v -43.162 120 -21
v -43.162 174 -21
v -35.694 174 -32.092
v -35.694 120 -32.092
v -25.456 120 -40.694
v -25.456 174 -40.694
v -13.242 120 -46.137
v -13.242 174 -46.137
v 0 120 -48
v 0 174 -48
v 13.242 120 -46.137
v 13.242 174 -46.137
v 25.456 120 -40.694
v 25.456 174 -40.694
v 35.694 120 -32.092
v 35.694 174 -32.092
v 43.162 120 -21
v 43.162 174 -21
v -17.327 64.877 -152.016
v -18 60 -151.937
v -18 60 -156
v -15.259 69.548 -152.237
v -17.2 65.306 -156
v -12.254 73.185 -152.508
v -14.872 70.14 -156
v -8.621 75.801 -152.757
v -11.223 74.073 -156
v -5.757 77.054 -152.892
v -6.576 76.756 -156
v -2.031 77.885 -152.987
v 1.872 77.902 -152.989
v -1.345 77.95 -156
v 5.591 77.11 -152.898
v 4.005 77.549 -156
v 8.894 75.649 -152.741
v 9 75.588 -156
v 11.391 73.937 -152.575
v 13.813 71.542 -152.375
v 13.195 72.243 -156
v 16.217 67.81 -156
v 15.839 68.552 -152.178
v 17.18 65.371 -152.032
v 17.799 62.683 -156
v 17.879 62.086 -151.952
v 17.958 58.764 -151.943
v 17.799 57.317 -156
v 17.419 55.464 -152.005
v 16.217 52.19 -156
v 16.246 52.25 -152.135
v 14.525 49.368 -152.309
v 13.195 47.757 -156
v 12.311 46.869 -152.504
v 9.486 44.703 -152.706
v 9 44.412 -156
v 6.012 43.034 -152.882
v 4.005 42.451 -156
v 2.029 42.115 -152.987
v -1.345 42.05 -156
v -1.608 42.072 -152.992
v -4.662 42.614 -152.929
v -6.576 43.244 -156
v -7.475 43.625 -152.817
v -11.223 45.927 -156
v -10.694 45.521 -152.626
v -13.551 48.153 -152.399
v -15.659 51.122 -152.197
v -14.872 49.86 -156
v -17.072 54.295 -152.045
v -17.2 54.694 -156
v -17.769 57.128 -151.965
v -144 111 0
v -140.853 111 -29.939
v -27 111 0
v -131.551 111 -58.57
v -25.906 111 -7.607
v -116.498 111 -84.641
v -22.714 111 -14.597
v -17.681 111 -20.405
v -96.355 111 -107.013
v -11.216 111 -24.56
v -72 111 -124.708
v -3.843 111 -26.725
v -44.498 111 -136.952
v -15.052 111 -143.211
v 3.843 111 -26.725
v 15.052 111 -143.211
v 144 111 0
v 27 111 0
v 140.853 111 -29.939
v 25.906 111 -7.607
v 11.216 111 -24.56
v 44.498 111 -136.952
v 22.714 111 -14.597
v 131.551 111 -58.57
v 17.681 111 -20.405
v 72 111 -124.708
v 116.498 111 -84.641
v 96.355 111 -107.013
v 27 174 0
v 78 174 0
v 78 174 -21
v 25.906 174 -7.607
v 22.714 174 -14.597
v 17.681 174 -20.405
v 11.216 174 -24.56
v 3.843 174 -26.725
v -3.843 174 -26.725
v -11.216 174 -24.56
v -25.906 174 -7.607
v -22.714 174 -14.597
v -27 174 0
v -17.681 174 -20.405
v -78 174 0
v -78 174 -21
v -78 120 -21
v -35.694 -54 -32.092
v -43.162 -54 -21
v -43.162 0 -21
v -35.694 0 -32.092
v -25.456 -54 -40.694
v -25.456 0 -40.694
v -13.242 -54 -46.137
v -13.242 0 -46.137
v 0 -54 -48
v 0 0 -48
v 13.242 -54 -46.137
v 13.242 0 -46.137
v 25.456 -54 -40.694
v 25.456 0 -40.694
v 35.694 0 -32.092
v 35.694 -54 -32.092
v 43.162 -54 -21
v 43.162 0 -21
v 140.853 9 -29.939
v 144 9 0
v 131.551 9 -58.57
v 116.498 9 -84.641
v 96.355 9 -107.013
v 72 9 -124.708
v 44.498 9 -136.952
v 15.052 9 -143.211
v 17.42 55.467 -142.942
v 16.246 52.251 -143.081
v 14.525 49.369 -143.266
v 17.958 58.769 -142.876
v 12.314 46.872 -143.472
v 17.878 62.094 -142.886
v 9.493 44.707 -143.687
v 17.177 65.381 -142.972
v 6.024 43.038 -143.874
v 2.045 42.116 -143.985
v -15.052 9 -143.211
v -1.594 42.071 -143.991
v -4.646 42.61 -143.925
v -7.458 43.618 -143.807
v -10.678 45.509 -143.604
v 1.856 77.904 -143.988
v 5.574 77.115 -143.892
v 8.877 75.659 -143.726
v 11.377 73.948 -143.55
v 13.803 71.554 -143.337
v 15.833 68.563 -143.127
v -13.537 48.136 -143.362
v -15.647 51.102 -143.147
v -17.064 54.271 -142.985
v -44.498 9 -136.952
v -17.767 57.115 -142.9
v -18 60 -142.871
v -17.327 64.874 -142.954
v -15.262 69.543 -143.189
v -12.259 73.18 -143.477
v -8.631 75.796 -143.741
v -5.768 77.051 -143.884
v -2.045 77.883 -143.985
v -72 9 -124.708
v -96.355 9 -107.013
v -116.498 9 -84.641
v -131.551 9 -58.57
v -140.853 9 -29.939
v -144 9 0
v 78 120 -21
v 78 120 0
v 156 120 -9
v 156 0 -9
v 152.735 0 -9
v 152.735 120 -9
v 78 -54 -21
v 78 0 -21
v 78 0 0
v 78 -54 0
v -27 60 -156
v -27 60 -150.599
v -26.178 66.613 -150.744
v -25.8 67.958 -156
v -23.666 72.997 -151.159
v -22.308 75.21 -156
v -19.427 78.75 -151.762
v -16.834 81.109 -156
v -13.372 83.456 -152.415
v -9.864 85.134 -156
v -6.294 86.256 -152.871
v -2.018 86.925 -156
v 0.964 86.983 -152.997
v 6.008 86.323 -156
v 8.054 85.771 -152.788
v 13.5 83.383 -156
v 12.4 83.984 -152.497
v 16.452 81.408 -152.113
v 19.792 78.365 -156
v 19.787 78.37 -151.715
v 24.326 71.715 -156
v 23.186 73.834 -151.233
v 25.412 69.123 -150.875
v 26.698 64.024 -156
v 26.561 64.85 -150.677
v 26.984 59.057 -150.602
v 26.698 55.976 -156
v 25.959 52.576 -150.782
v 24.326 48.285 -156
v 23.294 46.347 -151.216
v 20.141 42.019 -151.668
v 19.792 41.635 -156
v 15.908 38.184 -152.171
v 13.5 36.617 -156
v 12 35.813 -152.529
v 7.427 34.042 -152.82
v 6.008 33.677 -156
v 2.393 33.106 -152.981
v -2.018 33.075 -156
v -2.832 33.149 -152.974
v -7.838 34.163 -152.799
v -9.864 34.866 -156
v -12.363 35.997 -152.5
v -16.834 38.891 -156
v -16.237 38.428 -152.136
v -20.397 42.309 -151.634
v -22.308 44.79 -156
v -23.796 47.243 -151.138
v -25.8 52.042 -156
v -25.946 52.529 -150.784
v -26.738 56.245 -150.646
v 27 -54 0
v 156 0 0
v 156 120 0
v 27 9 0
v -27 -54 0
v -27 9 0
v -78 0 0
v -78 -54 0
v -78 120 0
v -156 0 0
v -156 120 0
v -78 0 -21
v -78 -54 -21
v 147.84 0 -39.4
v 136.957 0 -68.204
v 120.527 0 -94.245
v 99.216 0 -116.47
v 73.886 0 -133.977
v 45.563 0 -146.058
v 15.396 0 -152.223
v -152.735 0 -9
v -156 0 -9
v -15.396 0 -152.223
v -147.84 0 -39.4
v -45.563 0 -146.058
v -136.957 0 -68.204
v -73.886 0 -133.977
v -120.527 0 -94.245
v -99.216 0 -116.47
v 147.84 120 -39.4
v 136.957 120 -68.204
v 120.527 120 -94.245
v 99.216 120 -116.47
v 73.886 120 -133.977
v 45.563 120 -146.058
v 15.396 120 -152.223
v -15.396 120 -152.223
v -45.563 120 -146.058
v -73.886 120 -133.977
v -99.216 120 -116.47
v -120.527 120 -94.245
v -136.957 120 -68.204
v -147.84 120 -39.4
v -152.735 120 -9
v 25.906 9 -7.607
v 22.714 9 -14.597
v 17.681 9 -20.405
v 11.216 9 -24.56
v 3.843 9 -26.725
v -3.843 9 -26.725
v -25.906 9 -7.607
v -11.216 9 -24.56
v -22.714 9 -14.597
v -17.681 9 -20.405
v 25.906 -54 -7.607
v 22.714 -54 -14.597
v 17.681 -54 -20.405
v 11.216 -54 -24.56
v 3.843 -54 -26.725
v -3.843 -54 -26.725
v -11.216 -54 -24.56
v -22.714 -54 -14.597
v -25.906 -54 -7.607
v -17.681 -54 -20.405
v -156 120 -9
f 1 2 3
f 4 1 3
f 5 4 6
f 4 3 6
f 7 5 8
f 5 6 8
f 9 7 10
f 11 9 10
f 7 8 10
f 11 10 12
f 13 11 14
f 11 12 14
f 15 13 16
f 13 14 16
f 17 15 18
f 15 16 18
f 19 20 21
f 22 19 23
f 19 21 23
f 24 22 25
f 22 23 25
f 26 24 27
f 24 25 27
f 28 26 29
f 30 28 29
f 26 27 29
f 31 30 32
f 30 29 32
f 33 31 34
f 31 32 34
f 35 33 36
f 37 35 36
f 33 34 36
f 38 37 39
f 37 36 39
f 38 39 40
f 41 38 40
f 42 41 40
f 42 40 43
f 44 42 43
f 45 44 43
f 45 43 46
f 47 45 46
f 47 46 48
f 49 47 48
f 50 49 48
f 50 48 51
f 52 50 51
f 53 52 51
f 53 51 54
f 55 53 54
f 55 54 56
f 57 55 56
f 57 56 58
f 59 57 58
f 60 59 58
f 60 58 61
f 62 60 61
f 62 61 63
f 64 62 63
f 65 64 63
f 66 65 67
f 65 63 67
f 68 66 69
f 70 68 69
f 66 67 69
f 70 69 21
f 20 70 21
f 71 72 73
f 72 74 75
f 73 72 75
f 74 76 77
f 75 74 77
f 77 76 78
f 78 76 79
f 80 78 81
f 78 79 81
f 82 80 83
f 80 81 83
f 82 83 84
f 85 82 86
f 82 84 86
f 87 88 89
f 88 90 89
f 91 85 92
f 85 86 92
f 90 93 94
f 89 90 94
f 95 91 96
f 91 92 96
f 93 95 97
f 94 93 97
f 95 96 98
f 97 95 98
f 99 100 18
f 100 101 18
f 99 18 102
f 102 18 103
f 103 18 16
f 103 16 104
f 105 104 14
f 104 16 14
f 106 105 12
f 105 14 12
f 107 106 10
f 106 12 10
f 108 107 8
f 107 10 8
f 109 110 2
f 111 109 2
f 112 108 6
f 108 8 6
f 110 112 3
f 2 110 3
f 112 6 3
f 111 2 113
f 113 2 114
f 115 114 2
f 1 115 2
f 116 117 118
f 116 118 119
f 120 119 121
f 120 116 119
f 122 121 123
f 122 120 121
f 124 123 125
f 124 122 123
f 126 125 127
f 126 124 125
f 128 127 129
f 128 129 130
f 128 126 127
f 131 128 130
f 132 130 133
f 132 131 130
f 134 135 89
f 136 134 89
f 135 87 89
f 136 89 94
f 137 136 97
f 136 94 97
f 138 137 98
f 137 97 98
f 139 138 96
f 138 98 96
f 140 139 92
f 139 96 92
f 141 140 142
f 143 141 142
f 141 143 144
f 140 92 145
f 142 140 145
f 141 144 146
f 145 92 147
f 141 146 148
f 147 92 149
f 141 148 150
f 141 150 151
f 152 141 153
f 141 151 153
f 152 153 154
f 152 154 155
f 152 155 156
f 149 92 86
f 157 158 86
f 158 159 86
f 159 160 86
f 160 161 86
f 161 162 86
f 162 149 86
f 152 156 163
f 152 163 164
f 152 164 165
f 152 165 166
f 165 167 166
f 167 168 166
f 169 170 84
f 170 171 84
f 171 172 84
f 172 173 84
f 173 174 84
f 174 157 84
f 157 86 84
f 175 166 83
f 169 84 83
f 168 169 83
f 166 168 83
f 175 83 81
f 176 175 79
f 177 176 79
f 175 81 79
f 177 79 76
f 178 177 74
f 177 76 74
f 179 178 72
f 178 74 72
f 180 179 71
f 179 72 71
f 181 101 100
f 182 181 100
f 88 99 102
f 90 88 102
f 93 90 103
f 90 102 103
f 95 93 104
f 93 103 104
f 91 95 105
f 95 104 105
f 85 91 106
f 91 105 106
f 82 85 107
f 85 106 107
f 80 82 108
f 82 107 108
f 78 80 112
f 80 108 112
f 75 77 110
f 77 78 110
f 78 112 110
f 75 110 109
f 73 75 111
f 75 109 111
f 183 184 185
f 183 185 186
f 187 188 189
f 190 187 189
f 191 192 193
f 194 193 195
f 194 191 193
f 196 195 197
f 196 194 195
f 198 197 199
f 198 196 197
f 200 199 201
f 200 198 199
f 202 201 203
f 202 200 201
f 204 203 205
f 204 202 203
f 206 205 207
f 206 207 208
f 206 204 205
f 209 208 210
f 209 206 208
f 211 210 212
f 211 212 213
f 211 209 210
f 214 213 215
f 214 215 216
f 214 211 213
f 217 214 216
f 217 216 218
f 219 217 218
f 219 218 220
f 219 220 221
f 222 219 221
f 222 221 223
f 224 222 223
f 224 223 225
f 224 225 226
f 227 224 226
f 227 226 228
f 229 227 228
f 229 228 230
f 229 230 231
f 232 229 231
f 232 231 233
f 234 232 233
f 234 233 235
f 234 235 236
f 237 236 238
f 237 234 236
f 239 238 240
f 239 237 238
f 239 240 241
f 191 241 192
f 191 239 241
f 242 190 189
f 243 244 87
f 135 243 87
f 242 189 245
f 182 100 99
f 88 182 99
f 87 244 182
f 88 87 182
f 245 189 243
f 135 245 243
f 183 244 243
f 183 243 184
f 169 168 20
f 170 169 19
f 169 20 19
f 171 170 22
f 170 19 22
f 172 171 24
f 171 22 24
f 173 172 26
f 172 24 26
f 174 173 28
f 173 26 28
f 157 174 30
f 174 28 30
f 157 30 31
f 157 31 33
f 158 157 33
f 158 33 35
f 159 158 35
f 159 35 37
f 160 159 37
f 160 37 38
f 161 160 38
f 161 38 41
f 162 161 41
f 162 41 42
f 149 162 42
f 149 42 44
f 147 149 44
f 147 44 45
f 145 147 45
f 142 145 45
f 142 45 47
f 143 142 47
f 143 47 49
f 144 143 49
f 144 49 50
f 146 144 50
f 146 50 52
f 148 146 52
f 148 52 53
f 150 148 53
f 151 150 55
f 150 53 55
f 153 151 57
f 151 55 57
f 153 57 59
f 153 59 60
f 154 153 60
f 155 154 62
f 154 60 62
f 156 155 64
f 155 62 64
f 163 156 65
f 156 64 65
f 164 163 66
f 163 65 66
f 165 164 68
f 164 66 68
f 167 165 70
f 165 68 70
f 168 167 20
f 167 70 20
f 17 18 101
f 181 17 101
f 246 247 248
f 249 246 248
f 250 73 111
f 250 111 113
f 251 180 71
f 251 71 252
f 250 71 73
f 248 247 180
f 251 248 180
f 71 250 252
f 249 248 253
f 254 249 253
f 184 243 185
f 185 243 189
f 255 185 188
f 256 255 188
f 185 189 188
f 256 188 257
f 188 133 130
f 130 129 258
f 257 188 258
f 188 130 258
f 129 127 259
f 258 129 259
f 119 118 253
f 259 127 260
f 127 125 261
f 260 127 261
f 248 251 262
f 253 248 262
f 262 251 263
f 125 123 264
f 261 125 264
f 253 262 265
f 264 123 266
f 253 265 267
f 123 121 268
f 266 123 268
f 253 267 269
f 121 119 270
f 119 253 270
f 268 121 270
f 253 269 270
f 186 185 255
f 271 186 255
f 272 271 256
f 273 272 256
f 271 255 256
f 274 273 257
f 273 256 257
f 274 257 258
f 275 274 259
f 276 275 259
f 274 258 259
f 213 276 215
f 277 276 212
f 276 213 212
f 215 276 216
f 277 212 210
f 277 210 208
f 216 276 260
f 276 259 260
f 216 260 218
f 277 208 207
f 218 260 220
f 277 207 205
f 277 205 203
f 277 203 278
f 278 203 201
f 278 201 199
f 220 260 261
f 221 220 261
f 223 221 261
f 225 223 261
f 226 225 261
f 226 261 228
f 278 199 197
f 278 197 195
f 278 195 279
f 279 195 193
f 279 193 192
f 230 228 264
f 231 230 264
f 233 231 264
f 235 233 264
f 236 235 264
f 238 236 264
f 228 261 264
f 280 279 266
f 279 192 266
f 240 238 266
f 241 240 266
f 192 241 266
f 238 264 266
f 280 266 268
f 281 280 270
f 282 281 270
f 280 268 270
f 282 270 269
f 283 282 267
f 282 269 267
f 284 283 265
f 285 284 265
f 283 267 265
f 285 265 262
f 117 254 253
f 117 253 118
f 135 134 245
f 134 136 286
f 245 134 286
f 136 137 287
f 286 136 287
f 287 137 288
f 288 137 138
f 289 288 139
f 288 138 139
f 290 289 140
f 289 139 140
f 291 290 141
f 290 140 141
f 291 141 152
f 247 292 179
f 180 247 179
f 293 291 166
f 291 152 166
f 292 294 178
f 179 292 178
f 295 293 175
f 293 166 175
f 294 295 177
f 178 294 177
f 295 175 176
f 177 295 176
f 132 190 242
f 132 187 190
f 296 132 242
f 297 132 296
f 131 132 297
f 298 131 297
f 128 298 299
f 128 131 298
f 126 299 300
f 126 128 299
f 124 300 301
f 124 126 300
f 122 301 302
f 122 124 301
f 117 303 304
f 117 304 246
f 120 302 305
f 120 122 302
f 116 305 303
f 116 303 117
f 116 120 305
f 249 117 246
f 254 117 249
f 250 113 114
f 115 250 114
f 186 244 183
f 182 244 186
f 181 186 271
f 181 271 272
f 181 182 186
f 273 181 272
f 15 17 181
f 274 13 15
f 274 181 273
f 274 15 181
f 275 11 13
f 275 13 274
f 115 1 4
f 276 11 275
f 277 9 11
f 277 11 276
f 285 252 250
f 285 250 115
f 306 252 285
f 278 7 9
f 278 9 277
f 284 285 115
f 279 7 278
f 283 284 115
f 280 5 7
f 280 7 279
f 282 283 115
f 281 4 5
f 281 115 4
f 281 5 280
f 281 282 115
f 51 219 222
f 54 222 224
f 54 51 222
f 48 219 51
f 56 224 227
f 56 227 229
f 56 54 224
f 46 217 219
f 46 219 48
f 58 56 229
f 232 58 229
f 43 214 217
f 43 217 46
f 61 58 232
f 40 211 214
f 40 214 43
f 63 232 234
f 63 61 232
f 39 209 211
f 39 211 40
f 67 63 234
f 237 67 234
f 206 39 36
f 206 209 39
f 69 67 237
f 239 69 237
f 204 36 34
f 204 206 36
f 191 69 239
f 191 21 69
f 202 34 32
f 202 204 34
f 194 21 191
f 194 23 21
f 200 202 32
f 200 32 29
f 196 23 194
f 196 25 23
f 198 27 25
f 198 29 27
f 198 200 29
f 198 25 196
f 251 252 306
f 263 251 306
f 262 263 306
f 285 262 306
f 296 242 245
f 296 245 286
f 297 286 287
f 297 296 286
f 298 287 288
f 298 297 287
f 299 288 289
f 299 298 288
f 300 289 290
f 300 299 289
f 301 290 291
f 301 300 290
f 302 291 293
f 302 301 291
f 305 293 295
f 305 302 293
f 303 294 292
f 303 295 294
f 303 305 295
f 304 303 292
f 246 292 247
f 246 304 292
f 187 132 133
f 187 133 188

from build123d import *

# Parameters (mm, degrees)
REVOLVE1_ANGLE          = 180
SKETCH3_W               = 9
SKETCH3_H               = 120
BOSS_EXTRUDE3_DEPTH     = 3.264935
BOSS_EXTRUDE4_REACH     = 158
SKETCH6_R               = 27
SKETCH6_R_2             = 18
SKETCH7_R               = 18
CUT_EXTRUDE1_DEPTH      = 157
BOSS_EXTRUDE5_DEPTH     = 54
CUT_EXTRUDE2_DEPTH      = 175.0000001
CUT_EXTRUDE2_DEPTH_BACK = 1


with BuildPart() as part:
    # Sketch1 → Revolve1 (revolve)
    with BuildSketch(Plane.XY):
        Polygon((144, 9), (144, 111), (0, 111), (0, 120), (153, 120), (153, 0), (0, 0), (0, 9), align=None)
    revolve(axis=Axis((0, 0, 0), (0, 1, 0)), revolution_arc=REVOLVE1_ANGLE)

    # Sketch3 → Boss-Extrude3 (add)
    with BuildSketch(Plane(origin=(156, 0, 0), x_dir=(0, 0, -1), z_dir=(1, 0, 0))):
        with Locations((4.5, 60)):
            Rectangle(SKETCH3_W, SKETCH3_H)
    boss_extrude3 = extrude(amount=-BOSS_EXTRUDE3_DEPTH)

    # Mirror4: Boss-Extrude3 across plane
    add(boss_extrude3.mirror(Plane(origin=(0, 0, 0), x_dir=(0, 0, 1), z_dir=(1, 0, 0))))

    # Sketch6 → Boss-Extrude4 (add, up to next)
    with BuildSketch(Plane(origin=(0, 0, -156), x_dir=(-1, 0, 0), z_dir=(0, 0, -1)), mode=Mode.PRIVATE) as boss_extrude4_sk1:
        with Locations((0, 60)):
            Circle(SKETCH6_R)
        with Locations((0, 60)):
            Circle(SKETCH6_R_2, mode=Mode.SUBTRACT)
    boss_extrude4_tool1 = extrude(boss_extrude4_sk1.sketch, amount=-BOSS_EXTRUDE4_REACH, mode=Mode.PRIVATE) - part.part
    add(boss_extrude4_tool1.solids().sort_by_distance((26.236325, 60, -156))[0])

    # Sketch7 → Cut-Extrude1 (cut, through all)
    with BuildSketch(Plane(origin=(0, 0, -156), x_dir=(-1, 0, 0), z_dir=(0, 0, -1))):
        with Locations((0, 60)):
            Circle(SKETCH7_R)
    extrude(amount=-CUT_EXTRUDE1_DEPTH, mode=Mode.SUBTRACT)

    # Sketch8 → Boss-Extrude5 (add)
    with BuildSketch(Plane(origin=(0, -54, 0), x_dir=(1, 0, 0), z_dir=(0, 1, 0))):
        with BuildLine():
            Line((78, 0), (27, 0))
            ThreePointArc((27, 0), (0, 27), (-27, 0))
            Line((-27, 0), (-78, 0))
            Line((-78, 0), (-78, 21))
            Line((-78, 21), (-43.16248371, 21))
            ThreePointArc((-43.16248371, 21), (0, 48), (43.16248371, 21))
            Line((43.16248371, 21), (78, 21))
            Line((78, 21), (78, 0))
        make_face()
    boss_extrude5 = extrude(amount=BOSS_EXTRUDE5_DEPTH)

    # Sketch9 → Cut-Extrude2 (cut, two sides)
    with BuildSketch(Plane(origin=(0, -54, 0), x_dir=(1, 0, 0), z_dir=(0, 1, 0))) as cut_extrude2_sk:
        with BuildLine():
            Line((27, -490.936586386), (27, 0))
            ThreePointArc((27, 0), (0, 27), (-27, 0))
            Line((-27, 0), (-27, -490.936586386))
            Line((-27, -490.936586386), (-27, -1472.809759159))
            Line((-27, -1472.809759159), (27, -1472.809759159))
            Line((27, -1472.809759159), (27, -490.936586386))
        make_face()
    extrude(amount=CUT_EXTRUDE2_DEPTH, mode=Mode.SUBTRACT)
    extrude(cut_extrude2_sk.sketch, amount=-CUT_EXTRUDE2_DEPTH_BACK, mode=Mode.SUBTRACT)

    # Mirror6: Boss-Extrude5 across plane
    add(boss_extrude5.mirror(Plane.ZX.offset(60)))


solid = part.part
